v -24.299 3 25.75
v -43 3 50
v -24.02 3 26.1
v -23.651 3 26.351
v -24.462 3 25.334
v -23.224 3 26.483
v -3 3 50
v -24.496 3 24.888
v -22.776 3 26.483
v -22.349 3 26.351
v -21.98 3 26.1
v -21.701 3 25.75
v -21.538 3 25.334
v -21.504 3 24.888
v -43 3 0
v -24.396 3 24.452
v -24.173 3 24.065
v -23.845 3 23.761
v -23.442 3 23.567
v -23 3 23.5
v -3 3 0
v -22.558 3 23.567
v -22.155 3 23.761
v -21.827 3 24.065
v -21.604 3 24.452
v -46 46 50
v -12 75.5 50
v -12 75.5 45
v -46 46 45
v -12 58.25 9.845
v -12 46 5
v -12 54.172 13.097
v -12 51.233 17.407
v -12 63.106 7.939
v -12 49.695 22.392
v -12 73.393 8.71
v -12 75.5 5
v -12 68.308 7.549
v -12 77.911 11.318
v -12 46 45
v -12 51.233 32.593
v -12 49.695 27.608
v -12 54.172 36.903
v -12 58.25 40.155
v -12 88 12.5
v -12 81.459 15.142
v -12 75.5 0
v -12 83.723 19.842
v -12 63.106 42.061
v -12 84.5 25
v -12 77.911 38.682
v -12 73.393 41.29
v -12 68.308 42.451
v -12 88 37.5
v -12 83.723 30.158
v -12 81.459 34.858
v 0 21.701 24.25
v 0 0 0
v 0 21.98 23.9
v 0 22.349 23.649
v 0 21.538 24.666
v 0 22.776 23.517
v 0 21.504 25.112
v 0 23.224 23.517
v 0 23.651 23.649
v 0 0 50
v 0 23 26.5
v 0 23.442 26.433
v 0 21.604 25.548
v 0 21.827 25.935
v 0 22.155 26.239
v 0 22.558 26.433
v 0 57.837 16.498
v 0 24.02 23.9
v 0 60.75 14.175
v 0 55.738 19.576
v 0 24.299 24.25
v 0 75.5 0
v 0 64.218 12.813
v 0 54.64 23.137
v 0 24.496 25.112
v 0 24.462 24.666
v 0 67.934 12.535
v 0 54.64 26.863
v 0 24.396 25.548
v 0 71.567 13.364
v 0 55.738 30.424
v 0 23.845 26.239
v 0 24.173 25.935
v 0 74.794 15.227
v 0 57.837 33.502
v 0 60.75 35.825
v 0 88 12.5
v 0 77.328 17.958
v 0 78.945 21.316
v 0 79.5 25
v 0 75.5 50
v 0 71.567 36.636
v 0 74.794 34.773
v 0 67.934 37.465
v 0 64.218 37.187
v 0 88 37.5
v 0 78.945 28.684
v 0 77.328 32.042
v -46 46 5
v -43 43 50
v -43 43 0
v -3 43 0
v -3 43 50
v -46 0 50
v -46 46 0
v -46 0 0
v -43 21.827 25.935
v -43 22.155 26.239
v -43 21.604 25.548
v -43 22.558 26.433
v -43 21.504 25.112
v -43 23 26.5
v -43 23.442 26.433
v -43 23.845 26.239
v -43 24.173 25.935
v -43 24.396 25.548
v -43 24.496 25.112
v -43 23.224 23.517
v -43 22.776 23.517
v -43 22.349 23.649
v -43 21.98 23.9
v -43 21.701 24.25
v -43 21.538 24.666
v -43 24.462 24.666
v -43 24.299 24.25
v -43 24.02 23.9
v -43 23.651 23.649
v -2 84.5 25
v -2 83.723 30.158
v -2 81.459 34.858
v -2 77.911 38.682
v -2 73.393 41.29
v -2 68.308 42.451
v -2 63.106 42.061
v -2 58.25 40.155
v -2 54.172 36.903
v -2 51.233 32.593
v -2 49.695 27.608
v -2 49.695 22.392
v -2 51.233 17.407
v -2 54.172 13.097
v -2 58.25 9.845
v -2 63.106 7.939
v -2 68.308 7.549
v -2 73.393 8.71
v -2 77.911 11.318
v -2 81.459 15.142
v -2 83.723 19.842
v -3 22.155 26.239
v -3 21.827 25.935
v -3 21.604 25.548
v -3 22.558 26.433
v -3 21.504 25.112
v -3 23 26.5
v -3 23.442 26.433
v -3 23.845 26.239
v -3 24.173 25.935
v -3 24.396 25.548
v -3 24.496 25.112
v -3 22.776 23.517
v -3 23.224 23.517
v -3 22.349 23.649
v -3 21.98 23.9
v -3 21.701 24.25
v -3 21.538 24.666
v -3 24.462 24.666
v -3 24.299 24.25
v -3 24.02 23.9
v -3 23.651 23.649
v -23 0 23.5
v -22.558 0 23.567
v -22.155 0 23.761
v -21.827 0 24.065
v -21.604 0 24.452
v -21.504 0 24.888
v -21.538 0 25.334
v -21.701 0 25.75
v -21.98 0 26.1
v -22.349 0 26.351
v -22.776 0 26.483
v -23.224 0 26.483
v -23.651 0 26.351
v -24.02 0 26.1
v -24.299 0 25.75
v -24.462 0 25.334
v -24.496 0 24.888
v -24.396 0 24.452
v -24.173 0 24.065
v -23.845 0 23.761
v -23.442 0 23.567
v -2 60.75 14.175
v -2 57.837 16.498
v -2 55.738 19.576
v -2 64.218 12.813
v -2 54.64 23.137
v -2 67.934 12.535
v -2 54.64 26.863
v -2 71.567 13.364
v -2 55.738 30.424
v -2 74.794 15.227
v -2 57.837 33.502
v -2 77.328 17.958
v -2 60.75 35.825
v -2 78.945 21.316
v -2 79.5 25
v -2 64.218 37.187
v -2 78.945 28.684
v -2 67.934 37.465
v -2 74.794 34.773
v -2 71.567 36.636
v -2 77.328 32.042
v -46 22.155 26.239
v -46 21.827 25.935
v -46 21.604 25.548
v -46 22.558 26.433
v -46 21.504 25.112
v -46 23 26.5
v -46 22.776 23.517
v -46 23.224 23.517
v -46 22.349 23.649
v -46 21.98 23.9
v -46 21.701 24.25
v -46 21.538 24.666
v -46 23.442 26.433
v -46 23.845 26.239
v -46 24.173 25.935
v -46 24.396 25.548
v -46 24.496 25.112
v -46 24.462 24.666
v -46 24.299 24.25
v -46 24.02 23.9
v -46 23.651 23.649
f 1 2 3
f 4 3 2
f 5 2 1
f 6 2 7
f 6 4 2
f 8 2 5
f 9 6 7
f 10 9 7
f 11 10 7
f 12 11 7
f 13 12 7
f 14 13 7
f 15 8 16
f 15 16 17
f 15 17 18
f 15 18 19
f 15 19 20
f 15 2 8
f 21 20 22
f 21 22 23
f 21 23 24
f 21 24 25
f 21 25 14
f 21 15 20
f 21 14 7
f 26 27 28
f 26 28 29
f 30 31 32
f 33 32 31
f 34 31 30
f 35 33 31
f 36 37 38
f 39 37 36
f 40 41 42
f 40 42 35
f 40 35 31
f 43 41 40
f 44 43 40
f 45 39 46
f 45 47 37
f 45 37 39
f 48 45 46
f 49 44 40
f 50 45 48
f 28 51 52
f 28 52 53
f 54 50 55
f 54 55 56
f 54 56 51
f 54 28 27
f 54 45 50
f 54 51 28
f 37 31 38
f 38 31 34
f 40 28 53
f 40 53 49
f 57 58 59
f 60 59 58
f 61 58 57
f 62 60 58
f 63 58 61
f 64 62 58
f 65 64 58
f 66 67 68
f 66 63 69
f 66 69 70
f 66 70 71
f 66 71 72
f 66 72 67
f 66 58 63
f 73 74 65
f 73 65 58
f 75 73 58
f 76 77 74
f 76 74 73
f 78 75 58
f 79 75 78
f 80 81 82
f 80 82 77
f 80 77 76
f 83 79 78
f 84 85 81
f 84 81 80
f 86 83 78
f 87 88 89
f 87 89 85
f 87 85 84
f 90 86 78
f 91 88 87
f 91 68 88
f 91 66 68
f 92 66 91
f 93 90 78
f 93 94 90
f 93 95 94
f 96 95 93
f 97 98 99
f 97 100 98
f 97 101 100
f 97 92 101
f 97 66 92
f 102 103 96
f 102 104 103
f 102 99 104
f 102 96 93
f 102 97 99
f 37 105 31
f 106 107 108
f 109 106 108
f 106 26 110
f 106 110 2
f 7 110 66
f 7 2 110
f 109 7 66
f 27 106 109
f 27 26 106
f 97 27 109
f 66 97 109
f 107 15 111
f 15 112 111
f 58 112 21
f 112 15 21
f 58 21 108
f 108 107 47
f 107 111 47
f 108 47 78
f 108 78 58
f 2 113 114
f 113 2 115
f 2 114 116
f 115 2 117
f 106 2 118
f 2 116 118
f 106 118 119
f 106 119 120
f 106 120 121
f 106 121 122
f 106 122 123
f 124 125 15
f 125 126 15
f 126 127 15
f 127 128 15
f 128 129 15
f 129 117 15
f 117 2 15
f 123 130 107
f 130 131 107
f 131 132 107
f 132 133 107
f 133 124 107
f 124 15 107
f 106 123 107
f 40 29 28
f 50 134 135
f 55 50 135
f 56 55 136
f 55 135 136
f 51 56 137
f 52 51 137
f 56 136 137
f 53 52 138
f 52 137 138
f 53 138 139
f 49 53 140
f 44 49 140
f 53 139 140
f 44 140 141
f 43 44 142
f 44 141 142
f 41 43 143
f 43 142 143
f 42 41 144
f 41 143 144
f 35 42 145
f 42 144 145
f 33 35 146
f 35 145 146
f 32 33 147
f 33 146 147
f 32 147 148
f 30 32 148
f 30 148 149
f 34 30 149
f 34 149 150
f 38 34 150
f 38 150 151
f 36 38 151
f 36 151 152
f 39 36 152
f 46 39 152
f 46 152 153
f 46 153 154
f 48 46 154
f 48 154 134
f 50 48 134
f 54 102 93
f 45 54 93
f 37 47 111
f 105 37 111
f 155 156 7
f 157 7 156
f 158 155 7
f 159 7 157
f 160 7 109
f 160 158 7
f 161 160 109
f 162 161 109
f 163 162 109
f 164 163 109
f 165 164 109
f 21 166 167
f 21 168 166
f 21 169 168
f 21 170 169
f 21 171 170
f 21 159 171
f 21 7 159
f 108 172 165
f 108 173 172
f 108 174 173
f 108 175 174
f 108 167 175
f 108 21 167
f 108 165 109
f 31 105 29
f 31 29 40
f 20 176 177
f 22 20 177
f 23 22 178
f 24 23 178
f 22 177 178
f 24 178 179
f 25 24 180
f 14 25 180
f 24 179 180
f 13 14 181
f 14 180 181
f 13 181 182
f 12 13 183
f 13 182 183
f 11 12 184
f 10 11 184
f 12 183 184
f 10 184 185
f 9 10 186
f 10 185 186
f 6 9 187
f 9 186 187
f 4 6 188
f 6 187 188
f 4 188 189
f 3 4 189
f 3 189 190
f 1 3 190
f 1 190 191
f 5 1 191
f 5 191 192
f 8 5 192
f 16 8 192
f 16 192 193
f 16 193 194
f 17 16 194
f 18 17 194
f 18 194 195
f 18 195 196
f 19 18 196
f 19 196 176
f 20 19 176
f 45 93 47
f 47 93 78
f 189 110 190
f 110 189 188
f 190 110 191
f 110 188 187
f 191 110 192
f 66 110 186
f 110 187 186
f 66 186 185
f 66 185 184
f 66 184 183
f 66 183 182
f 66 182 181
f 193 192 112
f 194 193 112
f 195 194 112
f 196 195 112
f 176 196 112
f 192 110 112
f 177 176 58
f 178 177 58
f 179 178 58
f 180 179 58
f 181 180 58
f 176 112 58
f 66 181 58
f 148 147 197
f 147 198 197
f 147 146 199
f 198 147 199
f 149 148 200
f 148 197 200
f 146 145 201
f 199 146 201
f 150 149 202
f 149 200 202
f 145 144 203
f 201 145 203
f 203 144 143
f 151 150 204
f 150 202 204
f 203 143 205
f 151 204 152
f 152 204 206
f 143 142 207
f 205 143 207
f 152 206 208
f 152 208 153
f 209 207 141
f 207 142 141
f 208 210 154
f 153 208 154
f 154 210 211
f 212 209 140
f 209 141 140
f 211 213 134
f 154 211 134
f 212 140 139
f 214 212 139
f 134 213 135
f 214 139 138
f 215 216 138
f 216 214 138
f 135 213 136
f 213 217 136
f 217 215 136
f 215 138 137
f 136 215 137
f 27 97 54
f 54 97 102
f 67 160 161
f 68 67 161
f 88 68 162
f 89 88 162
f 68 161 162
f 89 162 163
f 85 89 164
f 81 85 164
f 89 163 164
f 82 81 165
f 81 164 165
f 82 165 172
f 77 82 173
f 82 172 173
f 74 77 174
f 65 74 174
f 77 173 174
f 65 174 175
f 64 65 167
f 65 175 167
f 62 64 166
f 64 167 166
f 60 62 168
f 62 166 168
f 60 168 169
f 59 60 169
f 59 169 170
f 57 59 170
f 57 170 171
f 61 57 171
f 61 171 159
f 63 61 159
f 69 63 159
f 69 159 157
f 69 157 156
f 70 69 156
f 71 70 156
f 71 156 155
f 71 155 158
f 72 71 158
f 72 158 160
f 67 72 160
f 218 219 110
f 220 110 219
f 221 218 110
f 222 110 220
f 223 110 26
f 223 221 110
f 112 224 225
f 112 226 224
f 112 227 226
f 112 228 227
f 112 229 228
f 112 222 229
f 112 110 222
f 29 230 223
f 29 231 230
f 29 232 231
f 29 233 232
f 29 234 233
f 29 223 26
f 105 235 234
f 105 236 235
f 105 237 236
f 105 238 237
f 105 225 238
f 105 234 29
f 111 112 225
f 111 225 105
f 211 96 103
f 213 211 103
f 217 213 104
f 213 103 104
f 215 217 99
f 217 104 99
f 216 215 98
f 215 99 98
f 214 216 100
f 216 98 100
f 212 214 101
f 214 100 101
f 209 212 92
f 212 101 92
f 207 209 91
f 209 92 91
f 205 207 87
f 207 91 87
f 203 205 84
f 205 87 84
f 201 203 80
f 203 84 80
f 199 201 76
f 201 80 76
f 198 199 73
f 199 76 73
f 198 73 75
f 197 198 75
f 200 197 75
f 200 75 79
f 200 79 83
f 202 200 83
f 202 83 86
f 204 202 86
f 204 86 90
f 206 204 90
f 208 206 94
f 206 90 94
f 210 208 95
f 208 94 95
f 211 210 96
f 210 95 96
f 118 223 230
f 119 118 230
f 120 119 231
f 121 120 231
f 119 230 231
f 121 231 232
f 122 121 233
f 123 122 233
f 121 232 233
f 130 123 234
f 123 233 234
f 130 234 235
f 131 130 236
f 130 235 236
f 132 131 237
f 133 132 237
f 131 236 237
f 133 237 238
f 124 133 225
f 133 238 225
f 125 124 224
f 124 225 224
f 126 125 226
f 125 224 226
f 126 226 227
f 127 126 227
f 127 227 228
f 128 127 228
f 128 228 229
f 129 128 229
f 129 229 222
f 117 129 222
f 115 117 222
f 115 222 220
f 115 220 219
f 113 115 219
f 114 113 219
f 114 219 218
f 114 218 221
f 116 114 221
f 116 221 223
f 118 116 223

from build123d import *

# Parameters (mm, degrees)
ESQUISSE1_W             = 46
ESQUISSE1_H             = 46
ESQUISSE1_W_2           = 40
ESQUISSE1_H_2           = 40
BOSS_EXTRU_1_DEPTH      = 50
ESQUISSE8_R             = 1.5
ENL_V_MAT_EXTRU_2_DEPTH = 83.048765987
ESQUISSE9_R             = 1.5
ENL_V_MAT_EXTRU_3_DEPTH = 13.5
ESQUISSE13_R            = 17.5
BOSS_EXTRU_4_DEPTH      = 12
ESQUISSE14_R            = 17.5
ESQUISSE14_R_2          = 12.5
BOSS_EXTRU_5_DEPTH      = 2
BOSS_EXTRU_6_DEPTH      = 5
BOSS_EXTRU_7_DEPTH      = 5


with BuildPart() as part:
    # Esquisse1 → Boss.-Extru.1 (new body)
    with BuildSketch(Plane.XY):
        with Locations((-23, 23)):
            Rectangle(ESQUISSE1_W, ESQUISSE1_H)
        with Locations((-23, 23)):
            Rectangle(ESQUISSE1_W_2, ESQUISSE1_H_2, mode=Mode.SUBTRACT)
    extrude(amount=BOSS_EXTRU_1_DEPTH)

    # Esquisse8 → Enlèv. mat.-Extru.2 (cut, through all)
    with BuildSketch(Plane.ZY.offset(46)):
        with Locations((25, 23)):
            Circle(ESQUISSE8_R)
    extrude(amount=-ENL_V_MAT_EXTRU_2_DEPTH, mode=Mode.SUBTRACT)

    # Esquisse9 → Enlèv. mat.-Extru.3 (cut)
    with BuildSketch(Plane.XZ):
        with Locations((-23, 25)):
            Circle(ESQUISSE9_R)
    extrude(amount=-ENL_V_MAT_EXTRU_3_DEPTH, mode=Mode.SUBTRACT)

    # Esquisse13 → Boss.-Extru.4 (add)
    with BuildSketch(Plane(origin=(0, 0, 0), x_dir=(0, 0, -1), z_dir=(1, 0, 0))):
        Polygon((-50, 46), (-50, 75.5), (-37.5, 88), (-12.5, 88), (0, 75.5), (0, 46), align=None)
        with Locations((-25, 67)):
            Circle(ESQUISSE13_R, mode=Mode.SUBTRACT)
    extrude(amount=-BOSS_EXTRU_4_DEPTH)

    # Esquisse14 → Boss.-Extru.5 (add)
    with BuildSketch(Plane(origin=(0, 0, 0), x_dir=(0, 0, -1), z_dir=(1, 0, 0))):
        with Locations((-25, 67)):
            Circle(ESQUISSE14_R)
        with Locations((-25, 67)):
            Circle(ESQUISSE14_R_2, mode=Mode.SUBTRACT)
    extrude(amount=-BOSS_EXTRU_5_DEPTH)

    # Esquisse15 → Boss.-Extru.6 (add)
    with BuildSketch(Plane(origin=(0, 0, 0), x_dir=(-1, 0, 0), z_dir=(0, 0, -1))):
        Polygon((12, 75.5), (46, 46), (12, 46), align=None)
    extrude(amount=-BOSS_EXTRU_6_DEPTH)

    # Esquisse16 → Boss.-Extru.7 (add)
    with BuildSketch(Plane.XY.offset(50)):
        Polygon((-12, 75.5), (-46, 46), (-12, 46), align=None)
    extrude(amount=-BOSS_EXTRU_7_DEPTH)


solid = part.part
